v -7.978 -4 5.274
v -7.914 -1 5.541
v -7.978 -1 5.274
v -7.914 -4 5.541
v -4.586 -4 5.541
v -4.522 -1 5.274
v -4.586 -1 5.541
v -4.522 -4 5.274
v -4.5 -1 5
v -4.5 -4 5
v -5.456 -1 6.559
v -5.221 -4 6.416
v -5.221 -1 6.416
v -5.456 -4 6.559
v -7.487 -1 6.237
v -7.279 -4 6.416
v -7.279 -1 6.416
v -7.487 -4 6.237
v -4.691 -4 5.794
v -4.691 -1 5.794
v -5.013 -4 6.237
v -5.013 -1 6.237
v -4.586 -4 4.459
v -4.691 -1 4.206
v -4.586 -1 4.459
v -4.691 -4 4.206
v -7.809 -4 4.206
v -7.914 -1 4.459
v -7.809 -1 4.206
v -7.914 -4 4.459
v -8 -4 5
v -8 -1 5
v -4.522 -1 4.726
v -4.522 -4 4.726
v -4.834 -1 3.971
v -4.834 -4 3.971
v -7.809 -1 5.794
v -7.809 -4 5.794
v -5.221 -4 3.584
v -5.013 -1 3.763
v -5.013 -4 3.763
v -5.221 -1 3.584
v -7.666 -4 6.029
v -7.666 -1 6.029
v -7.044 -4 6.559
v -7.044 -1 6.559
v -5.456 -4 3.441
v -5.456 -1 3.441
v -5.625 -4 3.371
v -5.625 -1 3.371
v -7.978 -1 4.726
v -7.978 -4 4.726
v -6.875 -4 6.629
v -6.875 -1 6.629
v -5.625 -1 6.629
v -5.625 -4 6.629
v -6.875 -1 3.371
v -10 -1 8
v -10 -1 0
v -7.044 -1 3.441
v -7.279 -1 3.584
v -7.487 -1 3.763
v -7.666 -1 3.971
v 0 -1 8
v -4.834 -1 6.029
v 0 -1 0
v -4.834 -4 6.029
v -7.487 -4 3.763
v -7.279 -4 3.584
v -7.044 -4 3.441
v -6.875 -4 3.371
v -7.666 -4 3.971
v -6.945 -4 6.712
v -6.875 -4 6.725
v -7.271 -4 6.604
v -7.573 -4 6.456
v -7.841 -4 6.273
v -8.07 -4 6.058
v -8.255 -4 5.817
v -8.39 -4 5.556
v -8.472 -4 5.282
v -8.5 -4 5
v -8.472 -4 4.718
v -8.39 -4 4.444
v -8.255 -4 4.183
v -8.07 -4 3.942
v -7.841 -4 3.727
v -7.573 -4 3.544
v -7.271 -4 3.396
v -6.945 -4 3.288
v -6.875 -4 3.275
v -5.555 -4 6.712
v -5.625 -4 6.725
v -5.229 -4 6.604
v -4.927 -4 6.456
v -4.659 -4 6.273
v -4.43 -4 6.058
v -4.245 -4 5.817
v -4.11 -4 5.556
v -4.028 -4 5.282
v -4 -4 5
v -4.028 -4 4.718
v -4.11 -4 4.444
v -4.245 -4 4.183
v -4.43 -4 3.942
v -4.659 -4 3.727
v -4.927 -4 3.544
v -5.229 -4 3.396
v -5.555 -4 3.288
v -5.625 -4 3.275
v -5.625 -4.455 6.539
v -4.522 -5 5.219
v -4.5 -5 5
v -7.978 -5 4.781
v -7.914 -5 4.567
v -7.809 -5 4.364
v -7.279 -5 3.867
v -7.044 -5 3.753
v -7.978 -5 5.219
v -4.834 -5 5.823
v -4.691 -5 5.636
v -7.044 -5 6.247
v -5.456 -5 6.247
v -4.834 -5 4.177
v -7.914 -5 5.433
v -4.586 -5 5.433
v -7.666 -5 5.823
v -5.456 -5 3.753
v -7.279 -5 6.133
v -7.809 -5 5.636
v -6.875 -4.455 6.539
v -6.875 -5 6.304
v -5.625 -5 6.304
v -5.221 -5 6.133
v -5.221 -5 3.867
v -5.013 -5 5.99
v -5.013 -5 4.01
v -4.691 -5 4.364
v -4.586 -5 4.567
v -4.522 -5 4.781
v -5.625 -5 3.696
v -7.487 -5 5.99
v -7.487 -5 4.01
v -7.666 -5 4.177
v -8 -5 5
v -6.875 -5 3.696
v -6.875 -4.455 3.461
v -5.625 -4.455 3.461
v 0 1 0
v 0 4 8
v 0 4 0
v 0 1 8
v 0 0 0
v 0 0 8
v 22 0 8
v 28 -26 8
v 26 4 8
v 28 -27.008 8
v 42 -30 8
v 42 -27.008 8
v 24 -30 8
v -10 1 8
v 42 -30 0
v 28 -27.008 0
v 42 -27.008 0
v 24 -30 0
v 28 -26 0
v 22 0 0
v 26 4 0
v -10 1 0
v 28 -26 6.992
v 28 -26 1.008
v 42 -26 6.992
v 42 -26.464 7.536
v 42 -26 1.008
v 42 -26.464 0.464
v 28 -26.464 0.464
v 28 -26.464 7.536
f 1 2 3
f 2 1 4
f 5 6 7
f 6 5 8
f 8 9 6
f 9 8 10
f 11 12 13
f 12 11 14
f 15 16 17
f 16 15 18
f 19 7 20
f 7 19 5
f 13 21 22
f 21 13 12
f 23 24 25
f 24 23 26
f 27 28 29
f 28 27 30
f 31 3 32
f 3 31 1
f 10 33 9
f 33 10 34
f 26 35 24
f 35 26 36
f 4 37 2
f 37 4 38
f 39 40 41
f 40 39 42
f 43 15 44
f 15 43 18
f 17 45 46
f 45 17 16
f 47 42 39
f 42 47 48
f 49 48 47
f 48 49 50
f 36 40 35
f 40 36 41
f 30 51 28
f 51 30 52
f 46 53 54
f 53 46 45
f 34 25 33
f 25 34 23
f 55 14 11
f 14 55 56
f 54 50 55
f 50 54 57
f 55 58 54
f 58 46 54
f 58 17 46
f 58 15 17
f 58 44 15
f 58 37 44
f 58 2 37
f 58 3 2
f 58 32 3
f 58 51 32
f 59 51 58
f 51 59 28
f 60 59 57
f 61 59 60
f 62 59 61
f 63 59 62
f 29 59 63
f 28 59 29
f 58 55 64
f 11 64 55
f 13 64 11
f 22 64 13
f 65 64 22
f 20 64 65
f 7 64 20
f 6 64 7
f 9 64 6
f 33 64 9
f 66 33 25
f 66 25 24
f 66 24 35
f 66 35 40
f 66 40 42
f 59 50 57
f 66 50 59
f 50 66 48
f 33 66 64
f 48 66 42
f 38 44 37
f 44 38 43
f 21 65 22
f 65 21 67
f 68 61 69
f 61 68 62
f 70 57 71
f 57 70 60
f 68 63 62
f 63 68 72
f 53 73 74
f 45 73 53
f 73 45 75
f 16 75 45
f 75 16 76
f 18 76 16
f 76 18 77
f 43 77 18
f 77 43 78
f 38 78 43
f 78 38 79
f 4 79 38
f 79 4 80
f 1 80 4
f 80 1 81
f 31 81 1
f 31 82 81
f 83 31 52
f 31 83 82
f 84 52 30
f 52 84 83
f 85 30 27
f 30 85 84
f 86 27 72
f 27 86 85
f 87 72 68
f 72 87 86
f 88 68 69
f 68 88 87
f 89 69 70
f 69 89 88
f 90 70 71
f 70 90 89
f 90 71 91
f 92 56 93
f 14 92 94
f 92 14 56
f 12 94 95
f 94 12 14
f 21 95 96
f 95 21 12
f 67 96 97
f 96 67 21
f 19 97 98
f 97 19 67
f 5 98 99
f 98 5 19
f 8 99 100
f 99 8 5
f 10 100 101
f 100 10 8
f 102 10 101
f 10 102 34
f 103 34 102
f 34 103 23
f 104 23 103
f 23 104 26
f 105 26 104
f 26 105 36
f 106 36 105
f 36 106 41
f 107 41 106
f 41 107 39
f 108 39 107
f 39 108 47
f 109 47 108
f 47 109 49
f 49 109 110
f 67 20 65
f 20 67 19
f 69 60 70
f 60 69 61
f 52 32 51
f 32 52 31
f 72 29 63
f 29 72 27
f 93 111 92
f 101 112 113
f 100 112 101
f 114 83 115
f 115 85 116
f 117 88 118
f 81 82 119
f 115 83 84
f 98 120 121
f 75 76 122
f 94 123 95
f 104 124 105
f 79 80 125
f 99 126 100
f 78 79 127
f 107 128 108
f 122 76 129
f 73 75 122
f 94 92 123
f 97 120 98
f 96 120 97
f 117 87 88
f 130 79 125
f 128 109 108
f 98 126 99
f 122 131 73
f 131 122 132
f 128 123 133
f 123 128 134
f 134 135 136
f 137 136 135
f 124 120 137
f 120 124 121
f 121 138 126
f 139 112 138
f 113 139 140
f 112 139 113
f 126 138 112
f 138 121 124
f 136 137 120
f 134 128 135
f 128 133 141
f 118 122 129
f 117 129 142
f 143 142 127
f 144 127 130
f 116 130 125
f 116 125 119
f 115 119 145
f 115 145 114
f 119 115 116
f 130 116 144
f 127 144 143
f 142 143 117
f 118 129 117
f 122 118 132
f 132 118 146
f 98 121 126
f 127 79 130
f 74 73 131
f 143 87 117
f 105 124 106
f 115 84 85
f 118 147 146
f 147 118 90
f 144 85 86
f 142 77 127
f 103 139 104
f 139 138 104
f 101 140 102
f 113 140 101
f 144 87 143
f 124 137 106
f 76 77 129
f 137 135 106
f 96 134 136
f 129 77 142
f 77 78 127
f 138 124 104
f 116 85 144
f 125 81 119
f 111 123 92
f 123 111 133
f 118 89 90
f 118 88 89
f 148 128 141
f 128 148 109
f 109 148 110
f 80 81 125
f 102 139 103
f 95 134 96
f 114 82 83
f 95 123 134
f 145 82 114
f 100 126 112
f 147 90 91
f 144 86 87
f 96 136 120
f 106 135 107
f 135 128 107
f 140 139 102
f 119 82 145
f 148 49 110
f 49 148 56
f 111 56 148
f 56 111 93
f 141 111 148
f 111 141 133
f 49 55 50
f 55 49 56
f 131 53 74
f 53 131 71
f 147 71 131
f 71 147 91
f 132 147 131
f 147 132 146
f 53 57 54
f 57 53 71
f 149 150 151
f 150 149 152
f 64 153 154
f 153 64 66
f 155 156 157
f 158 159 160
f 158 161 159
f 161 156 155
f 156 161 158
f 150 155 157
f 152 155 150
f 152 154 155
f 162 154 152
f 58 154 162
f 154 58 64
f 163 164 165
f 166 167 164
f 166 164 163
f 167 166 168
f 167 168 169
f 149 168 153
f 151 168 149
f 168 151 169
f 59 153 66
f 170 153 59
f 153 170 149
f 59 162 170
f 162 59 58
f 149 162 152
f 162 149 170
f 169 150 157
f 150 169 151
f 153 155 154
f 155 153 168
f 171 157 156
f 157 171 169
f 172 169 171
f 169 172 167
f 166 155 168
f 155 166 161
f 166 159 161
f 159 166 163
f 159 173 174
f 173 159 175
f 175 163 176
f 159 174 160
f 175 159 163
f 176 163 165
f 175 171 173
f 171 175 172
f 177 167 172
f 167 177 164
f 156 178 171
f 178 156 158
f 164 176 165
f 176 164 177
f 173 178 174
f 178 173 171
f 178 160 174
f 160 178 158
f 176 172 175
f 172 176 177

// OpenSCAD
// [FL_INDEX: keywords="openscad, 3d_parametric, Nintendo_3DSXL_L_R-Button_Extension, csg_solid" | COT="Parametric OpenSCAD design from 3DCodeverse"]
// Title: Nintendo 3DSXL L/R-Button Extension

/* Version 1.2 */
//Trigger height from the bottom of should button:
triggerZ=0; // [0:10]
//Distance from face of shoulder button to trigger:
triggerY=30; // [5:50]
//Width of trigger:
triggerWidth=18; // [10:30]
//Horizontal distance from system in tenths of mm:
triggerXoffset=20; // [15:80]
offset=triggerXoffset/10;
//Do you want the snap fit option?
snapFit=1; // [1:Yes, 0:No]
//Round peg is recommended.
pegShape=1; // [0:Square, 1:Round]
//Left or Right Button?
side=1; // [0:Left, 1:Right]

/*[Advanced]*/
//Peg width in hundredths of mm (350 is 3.50mm)
pSize=350;//[222:400]
pegSize=pSize/100;
//Peg Depth in hundredths of mm (400 is 4.00mm)
pDepth=400;//[300:500]
pegDepth=pDepth/100;
//Peg Gap width in hundredths of mm (100 is 1mm)
pGap=125;//[10:150]
pegGap=pGap/100;
//Peg Lip size in hundredths of mm (50 is 0.50mm)
pLip=50;//[10:100]
pegLip=pLip/100;

/* [Hidden] */
pWidth=22;//width of shoulder button face
pThickness=4;//thickness of part
pHeight=8;//height of shoulder button face
height=10;//magic number :-)

if (side==1){
	snap();extension();}
else{
	mirror([-1,0,0]){snap();extension();}
}

module snap(){if (snapFit == 1){
	translate([-10,-1,0])cube([10,2,pHeight]);//snap base

if (pegShape == 0){
	translate([-8, -1-pegDepth, 3])
	difference(){
		union(){
			cube([pegSize, pegDepth, pegSize]);
			translate([-pegLip, 0, 0])cube([pegSize +2*pegLip,1,pegSize]);
			}

		translate([pegSize/2 - pegGap/2, -1, -1])cube([pegGap, pegDepth+1, pegSize+2]);
		}
	}
if (pegShape == 1){
	translate([-8, -1-pegDepth, 3])
	difference(){
		union(){
			translate([pegSize/2,pegDepth,2])
			rotate([90,0,0])
			cylinder(h=pegDepth-1, r=pegSize/2, center=false, $fn=40);

			translate([pegSize/2,1,2])
			scale([1,1,.8])
			rotate([90,0,0])
			cylinder(h=1, r1=pegSize/2+pegLip, r2=pegSize/2, center=false, $fn=40);
			}
		
		translate([pegSize/2 -pegGap/2, -1, -1])cube([pegGap, pegDepth+1, pegSize+2]);
				}
			}
		}
	}

module extension(){
	difference(){
		union(){
			cube([pWidth,pThickness,pHeight]);	
			
			hull(){
				translate([pWidth,0,0])cube([pThickness, pThickness, pHeight]);
				translate([pWidth+offset, -triggerY, triggerZ])cube([pThickness, pThickness, pHeight]);
				}

			translate([pWidth+offset,-triggerY,triggerZ])
			cube([triggerWidth,pThickness,pHeight]);
			}
		
		translate([pWidth+offset+pThickness, -triggerY, triggerZ-1])
		difference(){
			cube([triggerWidth, height, height]);
			
			translate([-1,0,height/2])
			rotate([0,90,0])
			cylinder(h = triggerWidth+2, r=height/2, center = false, $fn=40);
		}
	}
}
// preview[view:south, tilt:top]
